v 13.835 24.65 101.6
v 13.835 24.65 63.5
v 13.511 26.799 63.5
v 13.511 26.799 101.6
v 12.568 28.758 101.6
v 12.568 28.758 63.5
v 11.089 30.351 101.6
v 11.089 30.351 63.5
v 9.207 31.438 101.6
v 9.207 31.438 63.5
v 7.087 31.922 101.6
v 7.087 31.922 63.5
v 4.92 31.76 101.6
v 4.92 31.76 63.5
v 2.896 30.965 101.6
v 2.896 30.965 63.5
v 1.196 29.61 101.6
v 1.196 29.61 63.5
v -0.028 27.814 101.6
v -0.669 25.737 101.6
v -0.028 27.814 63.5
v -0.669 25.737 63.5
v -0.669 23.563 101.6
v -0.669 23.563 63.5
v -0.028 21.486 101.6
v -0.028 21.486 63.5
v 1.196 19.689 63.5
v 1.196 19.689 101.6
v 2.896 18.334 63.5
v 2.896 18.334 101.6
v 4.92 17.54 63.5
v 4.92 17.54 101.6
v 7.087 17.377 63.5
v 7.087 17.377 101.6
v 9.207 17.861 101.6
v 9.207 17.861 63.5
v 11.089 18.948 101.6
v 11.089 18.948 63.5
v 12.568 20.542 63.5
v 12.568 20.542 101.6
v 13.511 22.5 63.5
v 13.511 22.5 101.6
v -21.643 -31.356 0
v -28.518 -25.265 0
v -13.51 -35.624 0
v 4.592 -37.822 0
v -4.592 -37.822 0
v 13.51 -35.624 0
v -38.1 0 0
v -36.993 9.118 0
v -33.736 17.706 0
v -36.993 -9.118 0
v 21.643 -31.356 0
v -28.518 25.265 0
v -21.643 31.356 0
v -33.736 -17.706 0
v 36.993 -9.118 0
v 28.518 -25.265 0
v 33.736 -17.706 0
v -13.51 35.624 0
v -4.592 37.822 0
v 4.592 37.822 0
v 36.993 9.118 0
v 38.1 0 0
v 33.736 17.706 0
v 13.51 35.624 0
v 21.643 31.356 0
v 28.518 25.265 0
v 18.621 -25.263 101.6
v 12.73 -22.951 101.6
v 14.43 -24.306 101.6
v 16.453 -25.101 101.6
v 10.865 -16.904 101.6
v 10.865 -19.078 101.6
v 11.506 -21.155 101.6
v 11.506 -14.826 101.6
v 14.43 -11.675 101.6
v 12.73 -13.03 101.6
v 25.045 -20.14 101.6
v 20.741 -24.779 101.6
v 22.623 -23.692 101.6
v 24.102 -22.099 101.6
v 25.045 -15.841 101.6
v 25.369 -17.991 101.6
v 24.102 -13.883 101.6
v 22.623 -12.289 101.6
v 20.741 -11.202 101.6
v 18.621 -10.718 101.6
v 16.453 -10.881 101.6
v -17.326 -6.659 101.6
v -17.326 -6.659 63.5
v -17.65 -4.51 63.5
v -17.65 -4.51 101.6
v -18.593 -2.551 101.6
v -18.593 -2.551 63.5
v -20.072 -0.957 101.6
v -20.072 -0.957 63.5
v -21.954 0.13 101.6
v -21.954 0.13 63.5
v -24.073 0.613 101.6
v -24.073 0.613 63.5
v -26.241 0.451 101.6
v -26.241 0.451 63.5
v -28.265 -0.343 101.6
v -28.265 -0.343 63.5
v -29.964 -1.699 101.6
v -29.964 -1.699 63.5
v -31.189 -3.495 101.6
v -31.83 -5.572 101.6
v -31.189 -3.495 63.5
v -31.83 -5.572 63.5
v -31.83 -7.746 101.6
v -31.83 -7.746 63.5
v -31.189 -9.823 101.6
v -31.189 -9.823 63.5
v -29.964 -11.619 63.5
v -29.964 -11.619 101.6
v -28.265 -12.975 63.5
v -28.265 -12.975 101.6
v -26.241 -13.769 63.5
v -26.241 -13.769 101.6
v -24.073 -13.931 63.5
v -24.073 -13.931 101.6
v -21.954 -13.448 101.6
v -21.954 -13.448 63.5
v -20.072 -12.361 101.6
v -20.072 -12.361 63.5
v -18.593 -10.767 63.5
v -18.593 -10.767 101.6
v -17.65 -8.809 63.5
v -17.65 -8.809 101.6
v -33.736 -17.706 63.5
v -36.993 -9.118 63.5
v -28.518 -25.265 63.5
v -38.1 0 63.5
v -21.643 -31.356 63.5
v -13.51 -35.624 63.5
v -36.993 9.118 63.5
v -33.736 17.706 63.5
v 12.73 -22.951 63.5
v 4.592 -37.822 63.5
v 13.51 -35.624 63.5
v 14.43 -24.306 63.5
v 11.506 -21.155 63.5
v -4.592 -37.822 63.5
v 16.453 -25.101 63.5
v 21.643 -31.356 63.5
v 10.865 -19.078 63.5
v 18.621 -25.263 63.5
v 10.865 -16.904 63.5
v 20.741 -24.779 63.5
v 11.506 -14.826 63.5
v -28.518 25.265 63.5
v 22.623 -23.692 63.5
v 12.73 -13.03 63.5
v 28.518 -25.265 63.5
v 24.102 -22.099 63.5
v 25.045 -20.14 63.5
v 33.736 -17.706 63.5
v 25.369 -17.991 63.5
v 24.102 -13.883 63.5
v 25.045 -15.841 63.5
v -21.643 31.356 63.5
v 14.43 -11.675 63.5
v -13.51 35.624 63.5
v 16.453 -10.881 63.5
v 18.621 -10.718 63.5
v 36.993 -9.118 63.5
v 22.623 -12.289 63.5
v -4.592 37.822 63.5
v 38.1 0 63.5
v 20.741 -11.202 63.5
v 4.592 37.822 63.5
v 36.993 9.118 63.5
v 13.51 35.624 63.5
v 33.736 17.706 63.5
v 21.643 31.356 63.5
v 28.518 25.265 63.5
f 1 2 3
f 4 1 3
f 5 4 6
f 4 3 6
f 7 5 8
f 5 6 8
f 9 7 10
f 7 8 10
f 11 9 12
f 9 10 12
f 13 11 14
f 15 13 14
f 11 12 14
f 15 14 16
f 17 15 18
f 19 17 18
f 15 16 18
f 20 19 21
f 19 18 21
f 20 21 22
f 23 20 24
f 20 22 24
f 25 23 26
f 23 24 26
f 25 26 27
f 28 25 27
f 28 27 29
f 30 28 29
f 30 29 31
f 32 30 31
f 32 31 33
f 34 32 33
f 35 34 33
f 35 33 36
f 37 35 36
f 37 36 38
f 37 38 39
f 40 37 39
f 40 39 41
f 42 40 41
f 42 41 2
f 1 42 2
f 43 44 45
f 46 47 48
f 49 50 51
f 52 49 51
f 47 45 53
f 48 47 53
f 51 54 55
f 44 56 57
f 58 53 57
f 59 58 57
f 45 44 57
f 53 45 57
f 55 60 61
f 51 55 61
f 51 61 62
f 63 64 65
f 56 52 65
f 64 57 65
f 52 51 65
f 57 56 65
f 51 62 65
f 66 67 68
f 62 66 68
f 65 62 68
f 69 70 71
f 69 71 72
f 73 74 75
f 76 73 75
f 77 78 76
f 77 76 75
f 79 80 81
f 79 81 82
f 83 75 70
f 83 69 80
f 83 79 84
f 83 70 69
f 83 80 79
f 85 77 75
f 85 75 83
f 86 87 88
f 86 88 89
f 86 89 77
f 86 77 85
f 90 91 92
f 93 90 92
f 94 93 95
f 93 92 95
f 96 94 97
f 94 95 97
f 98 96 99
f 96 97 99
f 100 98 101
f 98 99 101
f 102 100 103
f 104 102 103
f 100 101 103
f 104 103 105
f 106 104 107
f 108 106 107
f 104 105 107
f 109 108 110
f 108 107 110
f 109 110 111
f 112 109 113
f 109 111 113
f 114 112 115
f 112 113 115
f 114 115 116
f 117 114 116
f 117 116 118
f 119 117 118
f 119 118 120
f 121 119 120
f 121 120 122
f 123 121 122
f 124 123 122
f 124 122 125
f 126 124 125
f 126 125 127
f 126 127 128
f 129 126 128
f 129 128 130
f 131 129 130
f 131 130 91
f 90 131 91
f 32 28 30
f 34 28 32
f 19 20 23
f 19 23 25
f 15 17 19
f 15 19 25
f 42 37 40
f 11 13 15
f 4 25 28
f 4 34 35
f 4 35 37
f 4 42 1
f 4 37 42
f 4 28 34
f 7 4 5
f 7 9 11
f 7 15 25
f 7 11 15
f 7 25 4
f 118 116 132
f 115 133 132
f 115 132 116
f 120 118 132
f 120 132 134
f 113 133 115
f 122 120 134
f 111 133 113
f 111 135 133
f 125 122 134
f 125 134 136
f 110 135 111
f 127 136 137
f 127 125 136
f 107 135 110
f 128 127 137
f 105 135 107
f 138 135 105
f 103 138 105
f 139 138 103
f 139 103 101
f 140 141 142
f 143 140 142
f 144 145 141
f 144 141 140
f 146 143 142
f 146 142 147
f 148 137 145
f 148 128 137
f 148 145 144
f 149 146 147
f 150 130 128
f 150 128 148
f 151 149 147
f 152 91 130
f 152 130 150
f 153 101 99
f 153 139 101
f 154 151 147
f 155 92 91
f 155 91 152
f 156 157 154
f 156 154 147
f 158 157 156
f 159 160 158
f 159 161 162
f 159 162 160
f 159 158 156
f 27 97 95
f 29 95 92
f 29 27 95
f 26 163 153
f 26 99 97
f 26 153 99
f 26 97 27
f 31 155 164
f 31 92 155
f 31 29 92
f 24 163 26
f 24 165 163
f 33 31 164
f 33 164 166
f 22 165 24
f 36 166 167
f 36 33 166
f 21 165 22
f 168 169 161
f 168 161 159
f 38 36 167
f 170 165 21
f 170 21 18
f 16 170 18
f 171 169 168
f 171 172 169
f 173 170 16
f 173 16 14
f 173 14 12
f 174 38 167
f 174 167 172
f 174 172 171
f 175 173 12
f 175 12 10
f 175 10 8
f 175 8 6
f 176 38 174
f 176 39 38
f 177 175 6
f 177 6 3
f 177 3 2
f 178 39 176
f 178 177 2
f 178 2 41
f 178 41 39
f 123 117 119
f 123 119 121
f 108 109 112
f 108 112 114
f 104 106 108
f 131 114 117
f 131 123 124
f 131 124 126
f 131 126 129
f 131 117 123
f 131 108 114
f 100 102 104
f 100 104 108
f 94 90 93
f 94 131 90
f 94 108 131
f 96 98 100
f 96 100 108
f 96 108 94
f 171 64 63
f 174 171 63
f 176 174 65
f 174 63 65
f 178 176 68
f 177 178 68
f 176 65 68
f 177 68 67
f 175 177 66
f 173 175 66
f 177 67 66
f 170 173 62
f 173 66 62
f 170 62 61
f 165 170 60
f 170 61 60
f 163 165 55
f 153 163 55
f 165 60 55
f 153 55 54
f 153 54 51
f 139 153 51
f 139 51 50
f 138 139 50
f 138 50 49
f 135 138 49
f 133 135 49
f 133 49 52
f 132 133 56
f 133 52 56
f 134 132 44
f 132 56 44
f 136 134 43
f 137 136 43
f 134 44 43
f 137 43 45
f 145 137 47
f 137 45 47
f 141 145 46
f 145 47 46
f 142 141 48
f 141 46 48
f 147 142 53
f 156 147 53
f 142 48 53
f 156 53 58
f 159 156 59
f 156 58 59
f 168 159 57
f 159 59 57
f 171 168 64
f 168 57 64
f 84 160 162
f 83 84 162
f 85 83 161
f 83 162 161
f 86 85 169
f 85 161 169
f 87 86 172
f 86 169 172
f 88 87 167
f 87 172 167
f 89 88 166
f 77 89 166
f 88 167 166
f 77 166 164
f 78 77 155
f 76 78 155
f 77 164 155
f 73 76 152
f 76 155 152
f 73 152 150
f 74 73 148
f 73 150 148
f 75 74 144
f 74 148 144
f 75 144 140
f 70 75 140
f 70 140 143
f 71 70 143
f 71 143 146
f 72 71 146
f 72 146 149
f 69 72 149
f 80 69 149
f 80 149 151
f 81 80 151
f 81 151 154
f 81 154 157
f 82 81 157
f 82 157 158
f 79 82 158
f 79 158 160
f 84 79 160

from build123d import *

# Parameters (mm, degrees)
F0_R     = 38.1
F1_DEPTH = 63.5
F2_R     = 7.292745
F3_DEPTH = 101.6


with BuildPart() as f1:
    # F0 (on Top) → F1 (new body)
    with BuildSketch(Plane.XY):
        Circle(F0_R)
    extrude(amount=F1_DEPTH)

    # F2 (on Top) → F3 (join)
    with BuildSketch(Plane.XY):
        with Locations((6.542289, 24.649761)):
            Circle(F2_R)
        with Locations((-24.618464, -6.659092)):
            Circle(F2_R)
        with Locations((18.076175, -17.990669)):
            Circle(F2_R)
    extrude(amount=F3_DEPTH)


solid = f1.part
